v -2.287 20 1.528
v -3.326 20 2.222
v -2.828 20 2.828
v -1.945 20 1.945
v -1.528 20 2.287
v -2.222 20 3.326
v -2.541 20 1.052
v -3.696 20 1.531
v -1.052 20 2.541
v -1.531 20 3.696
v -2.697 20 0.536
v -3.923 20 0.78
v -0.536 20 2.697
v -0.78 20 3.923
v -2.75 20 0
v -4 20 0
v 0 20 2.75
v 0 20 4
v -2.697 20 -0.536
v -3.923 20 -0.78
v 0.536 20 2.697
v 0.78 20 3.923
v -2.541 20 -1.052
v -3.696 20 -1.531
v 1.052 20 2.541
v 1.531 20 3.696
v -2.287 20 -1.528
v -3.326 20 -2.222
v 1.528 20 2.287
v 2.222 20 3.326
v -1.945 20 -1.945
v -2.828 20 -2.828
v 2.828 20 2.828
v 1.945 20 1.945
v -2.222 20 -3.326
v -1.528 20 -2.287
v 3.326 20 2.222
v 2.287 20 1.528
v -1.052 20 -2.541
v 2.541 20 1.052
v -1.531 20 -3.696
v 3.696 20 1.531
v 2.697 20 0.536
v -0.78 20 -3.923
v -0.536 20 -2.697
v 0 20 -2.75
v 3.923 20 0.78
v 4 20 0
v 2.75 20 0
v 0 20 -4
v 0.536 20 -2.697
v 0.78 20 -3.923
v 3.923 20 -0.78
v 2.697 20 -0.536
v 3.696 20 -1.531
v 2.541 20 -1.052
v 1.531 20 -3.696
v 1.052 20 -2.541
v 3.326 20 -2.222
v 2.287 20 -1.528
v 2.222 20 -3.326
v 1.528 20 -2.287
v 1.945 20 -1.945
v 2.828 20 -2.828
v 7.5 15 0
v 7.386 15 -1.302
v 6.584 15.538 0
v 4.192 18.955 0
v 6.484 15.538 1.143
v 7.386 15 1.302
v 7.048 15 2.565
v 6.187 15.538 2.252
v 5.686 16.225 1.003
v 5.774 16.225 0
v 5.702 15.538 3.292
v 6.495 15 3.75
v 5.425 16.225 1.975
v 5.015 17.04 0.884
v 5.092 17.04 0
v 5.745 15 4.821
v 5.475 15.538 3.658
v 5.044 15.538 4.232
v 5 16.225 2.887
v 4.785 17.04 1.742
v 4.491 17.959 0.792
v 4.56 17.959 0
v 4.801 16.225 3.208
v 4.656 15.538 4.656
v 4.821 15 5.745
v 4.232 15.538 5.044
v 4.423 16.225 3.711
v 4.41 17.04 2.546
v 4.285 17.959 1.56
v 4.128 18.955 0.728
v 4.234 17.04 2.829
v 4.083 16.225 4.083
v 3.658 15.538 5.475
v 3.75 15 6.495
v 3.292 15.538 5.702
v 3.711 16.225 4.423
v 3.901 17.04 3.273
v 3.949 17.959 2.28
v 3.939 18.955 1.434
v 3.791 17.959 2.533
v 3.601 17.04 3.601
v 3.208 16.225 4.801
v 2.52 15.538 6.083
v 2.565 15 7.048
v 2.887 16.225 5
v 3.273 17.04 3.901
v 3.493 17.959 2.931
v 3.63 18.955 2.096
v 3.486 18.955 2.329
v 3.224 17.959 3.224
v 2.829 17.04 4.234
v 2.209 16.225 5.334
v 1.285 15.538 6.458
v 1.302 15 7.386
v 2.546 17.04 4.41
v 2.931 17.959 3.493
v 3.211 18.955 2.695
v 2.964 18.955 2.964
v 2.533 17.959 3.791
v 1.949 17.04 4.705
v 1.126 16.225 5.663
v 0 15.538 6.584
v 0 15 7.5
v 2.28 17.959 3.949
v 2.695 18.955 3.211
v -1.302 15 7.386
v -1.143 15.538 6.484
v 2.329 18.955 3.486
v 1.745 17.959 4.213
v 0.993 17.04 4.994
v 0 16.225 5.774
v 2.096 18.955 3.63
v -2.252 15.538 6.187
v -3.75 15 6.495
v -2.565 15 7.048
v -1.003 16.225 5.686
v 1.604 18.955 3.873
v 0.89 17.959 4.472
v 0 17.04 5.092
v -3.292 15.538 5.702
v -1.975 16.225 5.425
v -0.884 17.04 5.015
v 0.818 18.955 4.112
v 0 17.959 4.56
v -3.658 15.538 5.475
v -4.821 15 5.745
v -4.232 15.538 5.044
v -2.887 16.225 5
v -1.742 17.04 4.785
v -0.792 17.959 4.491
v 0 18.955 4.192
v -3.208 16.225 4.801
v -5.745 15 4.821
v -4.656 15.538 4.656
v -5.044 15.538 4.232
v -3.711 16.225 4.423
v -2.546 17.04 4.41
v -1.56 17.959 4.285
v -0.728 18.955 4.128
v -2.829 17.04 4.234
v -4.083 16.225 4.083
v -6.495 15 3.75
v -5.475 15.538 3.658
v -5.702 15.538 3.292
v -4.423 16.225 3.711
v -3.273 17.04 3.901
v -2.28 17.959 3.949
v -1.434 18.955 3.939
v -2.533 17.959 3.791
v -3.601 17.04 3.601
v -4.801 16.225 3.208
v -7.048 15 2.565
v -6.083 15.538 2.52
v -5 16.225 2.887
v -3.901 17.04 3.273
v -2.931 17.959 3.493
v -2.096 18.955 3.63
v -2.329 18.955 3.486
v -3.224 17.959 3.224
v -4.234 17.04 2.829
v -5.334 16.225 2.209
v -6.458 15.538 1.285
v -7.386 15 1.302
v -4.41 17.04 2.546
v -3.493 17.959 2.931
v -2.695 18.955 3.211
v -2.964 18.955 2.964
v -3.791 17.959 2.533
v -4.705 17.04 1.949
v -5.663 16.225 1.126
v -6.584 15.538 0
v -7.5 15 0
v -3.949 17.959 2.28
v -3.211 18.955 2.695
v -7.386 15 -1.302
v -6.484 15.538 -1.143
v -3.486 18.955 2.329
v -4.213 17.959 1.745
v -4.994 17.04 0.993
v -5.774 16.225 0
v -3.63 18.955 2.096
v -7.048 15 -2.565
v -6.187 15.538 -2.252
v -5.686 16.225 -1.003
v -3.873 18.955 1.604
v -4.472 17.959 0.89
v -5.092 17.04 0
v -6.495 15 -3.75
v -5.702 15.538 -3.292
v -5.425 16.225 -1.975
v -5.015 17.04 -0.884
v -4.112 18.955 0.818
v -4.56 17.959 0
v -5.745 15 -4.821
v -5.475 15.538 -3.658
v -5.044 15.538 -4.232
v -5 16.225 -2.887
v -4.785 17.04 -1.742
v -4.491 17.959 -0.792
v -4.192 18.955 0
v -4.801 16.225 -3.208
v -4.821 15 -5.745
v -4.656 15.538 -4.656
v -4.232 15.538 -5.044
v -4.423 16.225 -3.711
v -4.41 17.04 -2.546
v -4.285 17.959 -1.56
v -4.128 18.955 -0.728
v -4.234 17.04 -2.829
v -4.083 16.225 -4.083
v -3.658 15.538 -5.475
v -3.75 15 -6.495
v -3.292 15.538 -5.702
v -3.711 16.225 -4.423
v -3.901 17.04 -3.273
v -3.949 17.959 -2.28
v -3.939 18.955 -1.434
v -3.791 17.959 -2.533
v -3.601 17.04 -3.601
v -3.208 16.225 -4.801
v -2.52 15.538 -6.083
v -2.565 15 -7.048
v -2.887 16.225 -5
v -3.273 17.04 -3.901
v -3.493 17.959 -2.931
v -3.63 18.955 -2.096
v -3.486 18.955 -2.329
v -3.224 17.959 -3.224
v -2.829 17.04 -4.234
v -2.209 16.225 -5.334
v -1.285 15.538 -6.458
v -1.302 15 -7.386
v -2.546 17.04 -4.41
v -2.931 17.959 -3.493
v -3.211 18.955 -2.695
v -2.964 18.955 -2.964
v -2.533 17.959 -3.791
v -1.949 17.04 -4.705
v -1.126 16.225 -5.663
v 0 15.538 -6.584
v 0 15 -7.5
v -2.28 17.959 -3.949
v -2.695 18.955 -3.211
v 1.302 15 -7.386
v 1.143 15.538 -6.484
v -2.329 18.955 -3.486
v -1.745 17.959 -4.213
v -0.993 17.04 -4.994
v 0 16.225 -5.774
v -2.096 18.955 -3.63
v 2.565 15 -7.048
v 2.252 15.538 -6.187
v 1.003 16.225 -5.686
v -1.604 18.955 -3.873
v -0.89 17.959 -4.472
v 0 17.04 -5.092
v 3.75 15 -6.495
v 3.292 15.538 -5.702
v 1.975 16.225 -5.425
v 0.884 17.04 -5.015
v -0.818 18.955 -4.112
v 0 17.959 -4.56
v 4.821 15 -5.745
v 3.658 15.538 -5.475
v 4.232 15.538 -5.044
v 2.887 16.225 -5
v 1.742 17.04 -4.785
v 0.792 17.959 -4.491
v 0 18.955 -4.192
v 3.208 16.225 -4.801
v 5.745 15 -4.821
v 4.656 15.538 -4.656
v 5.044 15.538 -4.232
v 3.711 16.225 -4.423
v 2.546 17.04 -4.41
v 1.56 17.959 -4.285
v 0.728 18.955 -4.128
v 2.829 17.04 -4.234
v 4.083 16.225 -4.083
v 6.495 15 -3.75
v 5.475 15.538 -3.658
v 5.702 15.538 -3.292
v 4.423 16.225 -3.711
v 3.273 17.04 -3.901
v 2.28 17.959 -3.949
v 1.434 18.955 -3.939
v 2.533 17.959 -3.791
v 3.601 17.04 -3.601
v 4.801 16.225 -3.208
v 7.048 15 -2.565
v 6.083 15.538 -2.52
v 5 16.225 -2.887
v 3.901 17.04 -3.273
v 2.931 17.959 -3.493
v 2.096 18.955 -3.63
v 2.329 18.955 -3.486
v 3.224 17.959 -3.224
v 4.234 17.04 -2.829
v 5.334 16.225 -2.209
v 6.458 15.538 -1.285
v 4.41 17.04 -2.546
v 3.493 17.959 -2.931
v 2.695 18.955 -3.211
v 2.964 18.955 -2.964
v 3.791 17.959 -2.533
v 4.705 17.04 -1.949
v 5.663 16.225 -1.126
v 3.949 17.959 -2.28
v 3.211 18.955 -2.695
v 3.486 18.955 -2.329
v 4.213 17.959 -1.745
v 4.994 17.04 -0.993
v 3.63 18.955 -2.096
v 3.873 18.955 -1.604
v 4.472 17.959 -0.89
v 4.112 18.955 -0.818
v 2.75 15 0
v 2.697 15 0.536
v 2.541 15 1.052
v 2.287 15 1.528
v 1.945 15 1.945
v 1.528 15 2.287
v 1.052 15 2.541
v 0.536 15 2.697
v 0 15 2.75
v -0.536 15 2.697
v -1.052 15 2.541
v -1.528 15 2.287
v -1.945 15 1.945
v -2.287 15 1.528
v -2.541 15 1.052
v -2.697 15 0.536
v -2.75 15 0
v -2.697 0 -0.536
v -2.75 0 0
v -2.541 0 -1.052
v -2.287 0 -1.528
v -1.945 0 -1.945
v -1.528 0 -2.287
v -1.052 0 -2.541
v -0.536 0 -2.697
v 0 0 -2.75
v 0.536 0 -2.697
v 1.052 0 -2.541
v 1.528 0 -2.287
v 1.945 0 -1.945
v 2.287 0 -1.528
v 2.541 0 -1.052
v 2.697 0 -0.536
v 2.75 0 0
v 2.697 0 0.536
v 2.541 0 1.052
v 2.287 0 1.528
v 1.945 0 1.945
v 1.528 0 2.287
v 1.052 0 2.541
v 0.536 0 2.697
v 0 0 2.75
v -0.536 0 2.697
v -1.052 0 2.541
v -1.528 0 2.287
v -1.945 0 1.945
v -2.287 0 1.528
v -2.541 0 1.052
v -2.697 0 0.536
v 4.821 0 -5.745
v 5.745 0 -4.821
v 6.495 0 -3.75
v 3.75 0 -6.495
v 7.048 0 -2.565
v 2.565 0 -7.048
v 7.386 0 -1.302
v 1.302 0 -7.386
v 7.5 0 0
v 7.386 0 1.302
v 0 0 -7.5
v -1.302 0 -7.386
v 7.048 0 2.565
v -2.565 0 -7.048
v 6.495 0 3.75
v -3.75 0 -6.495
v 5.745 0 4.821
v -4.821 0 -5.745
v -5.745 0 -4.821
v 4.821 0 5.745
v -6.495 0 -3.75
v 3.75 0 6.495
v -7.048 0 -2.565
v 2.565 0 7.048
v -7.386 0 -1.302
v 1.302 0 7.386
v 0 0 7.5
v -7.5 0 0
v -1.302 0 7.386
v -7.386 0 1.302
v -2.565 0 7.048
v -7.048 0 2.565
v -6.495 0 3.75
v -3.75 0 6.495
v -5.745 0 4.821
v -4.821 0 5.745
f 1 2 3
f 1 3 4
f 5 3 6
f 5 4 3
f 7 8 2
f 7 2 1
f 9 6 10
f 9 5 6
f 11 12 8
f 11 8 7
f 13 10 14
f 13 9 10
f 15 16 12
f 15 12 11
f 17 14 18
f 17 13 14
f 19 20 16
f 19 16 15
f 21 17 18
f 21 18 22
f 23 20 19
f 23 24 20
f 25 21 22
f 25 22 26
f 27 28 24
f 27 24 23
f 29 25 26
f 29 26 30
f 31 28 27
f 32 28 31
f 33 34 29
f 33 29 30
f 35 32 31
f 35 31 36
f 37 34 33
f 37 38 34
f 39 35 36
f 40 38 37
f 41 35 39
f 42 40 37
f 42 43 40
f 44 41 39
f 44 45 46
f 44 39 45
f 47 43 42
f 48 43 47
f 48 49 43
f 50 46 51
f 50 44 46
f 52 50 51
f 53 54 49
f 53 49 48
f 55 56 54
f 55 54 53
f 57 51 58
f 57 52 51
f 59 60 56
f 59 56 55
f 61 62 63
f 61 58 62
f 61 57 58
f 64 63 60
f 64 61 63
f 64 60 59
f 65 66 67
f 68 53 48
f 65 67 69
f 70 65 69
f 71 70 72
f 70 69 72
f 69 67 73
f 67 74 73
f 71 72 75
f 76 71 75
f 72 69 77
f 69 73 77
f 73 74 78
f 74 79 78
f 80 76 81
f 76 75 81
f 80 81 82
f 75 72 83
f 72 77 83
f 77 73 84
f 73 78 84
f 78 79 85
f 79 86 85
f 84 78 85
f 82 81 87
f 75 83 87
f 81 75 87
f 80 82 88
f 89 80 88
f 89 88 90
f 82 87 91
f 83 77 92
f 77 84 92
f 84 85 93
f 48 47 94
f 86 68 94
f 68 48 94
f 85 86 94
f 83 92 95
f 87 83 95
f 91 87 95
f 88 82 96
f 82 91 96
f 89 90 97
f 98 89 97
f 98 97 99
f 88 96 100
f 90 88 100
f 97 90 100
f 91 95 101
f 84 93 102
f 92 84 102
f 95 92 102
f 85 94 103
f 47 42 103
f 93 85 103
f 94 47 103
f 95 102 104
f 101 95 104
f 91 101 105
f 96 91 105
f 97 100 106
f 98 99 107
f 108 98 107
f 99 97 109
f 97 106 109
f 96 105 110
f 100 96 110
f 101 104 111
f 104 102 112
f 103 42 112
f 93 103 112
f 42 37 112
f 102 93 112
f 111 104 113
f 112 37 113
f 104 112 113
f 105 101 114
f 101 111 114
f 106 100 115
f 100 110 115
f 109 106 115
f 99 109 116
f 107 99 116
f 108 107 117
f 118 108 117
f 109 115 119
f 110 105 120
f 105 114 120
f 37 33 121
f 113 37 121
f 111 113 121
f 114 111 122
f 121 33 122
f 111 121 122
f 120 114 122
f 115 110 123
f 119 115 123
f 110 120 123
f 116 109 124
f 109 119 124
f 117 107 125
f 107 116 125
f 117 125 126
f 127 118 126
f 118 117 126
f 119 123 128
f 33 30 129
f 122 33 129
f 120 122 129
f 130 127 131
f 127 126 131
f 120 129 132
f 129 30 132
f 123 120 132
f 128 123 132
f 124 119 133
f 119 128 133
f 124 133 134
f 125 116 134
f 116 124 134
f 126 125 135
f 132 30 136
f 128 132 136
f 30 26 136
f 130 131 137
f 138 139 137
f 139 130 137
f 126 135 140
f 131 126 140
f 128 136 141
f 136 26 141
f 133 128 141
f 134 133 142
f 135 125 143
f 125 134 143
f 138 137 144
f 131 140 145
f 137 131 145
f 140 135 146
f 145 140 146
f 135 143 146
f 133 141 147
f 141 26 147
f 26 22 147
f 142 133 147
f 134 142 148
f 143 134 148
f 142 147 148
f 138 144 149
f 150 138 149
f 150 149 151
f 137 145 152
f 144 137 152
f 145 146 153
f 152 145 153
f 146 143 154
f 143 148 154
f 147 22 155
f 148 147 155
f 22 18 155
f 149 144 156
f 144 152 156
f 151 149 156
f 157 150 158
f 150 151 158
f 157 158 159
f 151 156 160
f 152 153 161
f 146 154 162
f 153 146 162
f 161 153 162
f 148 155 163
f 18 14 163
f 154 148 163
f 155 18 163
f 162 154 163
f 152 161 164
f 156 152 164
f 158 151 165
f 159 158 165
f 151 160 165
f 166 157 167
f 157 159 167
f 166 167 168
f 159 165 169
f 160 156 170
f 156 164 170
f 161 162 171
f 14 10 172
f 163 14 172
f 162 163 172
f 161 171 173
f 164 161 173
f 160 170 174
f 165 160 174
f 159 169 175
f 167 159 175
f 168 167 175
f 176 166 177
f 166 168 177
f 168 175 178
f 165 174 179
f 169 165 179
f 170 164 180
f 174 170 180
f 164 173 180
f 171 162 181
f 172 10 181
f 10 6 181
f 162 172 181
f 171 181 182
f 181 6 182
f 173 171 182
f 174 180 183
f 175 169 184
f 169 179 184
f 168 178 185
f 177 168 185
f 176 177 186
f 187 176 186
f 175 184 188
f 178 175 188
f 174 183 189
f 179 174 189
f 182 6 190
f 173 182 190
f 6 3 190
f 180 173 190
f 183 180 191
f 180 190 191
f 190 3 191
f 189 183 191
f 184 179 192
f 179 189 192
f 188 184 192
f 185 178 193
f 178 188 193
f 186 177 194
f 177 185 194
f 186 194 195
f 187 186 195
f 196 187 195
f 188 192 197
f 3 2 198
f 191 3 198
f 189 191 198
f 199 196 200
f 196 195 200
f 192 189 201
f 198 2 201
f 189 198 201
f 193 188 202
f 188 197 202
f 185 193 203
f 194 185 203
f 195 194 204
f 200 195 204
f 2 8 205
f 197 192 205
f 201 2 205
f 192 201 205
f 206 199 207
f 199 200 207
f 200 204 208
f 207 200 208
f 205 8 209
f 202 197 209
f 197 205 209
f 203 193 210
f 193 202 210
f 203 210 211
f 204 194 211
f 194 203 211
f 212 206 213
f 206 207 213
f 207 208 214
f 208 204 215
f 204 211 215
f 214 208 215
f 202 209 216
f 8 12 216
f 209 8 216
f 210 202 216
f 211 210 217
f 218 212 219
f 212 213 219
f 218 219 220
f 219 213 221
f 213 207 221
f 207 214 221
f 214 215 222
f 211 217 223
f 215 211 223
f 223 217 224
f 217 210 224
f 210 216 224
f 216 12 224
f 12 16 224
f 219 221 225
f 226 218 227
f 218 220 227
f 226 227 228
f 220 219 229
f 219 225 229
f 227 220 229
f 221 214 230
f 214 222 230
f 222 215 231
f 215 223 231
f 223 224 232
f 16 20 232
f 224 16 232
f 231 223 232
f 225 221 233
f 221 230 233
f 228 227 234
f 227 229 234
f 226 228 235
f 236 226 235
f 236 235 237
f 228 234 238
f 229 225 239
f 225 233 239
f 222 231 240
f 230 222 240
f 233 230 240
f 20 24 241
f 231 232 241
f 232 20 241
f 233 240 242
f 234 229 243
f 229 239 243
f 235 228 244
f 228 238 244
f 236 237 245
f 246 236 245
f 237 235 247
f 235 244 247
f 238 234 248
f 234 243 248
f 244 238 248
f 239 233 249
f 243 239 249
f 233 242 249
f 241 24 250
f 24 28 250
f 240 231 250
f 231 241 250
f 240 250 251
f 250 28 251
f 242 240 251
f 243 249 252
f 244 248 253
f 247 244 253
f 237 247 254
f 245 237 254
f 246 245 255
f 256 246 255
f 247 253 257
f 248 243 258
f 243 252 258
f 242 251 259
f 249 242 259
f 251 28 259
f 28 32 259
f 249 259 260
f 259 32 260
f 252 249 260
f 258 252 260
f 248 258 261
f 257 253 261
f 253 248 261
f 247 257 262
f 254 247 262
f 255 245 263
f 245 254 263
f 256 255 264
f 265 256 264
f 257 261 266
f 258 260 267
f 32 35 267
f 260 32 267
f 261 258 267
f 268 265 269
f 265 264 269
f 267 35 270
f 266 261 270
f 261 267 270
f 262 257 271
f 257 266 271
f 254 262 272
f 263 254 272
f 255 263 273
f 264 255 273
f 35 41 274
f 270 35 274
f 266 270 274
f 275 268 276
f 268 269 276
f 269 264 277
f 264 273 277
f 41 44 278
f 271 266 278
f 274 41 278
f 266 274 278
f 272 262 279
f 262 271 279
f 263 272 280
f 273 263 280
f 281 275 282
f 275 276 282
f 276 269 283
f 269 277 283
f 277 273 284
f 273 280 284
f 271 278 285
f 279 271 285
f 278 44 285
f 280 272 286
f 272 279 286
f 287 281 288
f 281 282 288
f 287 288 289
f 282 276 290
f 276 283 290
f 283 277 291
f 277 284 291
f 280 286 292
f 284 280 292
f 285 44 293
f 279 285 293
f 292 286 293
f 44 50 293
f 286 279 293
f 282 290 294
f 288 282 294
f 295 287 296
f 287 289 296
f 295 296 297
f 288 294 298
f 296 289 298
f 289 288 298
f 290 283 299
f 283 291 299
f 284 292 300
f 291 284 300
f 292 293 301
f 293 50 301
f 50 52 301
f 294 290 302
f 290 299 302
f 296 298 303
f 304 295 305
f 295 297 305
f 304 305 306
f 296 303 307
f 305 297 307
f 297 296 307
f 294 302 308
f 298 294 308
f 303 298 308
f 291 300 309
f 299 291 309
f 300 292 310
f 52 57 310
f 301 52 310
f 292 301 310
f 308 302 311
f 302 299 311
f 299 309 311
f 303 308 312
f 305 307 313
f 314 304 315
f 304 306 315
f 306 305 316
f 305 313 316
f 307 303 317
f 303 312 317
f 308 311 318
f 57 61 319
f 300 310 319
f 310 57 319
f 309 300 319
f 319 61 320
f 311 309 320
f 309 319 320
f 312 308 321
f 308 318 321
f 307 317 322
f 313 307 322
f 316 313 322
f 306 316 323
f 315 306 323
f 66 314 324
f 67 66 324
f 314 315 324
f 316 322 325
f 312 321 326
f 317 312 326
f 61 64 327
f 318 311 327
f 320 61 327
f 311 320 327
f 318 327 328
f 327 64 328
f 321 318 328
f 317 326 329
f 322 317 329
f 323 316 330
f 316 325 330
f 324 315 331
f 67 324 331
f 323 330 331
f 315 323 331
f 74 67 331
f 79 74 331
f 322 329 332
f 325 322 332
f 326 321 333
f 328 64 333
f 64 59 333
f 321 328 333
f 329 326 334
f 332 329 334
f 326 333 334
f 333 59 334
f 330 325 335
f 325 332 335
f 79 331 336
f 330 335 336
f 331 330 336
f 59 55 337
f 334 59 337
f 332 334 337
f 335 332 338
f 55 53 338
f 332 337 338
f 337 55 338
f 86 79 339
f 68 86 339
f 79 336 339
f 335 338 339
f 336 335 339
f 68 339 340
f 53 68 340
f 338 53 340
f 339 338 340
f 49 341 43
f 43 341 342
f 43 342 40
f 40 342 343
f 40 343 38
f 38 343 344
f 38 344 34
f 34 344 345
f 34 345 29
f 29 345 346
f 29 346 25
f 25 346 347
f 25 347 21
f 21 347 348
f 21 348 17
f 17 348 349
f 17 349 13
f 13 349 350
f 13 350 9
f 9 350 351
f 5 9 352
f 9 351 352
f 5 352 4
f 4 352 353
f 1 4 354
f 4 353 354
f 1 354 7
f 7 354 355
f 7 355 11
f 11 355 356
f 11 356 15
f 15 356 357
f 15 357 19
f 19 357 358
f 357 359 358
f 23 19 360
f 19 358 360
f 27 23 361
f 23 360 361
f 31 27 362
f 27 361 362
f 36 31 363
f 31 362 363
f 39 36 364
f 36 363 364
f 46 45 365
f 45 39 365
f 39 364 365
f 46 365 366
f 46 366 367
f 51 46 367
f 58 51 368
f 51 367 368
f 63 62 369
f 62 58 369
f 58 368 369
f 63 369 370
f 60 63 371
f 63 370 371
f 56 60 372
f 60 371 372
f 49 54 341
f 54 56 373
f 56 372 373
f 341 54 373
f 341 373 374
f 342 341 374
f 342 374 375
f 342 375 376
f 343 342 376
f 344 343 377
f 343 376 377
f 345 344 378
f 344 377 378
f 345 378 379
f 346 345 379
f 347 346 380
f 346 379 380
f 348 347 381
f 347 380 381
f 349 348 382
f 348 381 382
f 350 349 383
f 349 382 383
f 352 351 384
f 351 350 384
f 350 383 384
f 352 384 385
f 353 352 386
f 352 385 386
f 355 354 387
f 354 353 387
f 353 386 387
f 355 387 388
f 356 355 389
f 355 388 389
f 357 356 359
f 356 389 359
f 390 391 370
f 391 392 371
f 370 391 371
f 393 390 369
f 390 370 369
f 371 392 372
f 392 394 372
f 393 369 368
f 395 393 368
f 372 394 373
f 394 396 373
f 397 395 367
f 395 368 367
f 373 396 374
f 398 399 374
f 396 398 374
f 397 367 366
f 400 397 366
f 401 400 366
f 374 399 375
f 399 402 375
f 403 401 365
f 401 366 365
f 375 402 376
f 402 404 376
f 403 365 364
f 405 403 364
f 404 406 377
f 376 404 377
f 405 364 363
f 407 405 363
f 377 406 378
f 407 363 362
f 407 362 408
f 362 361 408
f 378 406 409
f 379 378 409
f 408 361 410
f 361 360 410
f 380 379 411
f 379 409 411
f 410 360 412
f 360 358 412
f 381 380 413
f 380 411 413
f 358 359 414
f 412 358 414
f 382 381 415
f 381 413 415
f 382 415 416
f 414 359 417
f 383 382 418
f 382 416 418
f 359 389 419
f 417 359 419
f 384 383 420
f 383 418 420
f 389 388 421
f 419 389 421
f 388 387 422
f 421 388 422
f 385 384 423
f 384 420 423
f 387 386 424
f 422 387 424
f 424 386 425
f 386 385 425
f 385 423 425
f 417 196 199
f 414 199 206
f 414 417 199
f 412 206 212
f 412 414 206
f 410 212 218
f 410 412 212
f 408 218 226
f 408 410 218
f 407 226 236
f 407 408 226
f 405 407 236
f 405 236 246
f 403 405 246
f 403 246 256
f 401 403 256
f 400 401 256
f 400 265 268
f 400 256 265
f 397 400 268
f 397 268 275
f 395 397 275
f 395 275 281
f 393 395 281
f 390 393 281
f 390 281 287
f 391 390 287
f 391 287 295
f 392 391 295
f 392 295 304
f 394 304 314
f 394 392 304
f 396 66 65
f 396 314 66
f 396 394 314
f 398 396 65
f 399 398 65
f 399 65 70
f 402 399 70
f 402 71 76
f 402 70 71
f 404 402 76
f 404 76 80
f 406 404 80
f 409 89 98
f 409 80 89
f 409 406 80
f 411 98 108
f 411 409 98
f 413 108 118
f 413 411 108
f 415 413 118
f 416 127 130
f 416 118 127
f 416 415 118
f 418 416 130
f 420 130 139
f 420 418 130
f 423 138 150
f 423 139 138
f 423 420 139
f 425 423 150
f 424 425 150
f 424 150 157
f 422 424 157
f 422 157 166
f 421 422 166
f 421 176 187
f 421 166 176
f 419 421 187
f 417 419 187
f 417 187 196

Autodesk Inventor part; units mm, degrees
ref_plane "YZ Plane" through (0, 0, 0) normal (1, 0, 0) x (0, 1, 0)
ref_plane "XZ Plane" through (0, 0, 0) normal (0, 1, 0) x (-1, 0, 0)
ref_plane "XY Plane" through (0, 0, 0) normal (0, 0, 1) x (1, 0, 0)
sketch "Sketch1" plane through (0, 0, 0) normal (0, 1, 0) x (-1, 0, 0)
  circle A0 centre (0, 0) radius 7.5
  circle A1 centre (0, 0) radius 2.75
  dimension "d0" = 15
  dimension "d1" = 5.5
extrude "Extrusion1" add sketch "Sketch1" along normal blind 15
sketch "Sketch2" plane through (0, 15, 0) normal (0, 1, 0) x (1, 0, 0)
  circle A0 centre (0, 0) radius 2.75
  circle A1 centre (0, 0) radius 2.75 projected
  circle A2 centre (0, 0) radius 4
  dimension "d4" = 5.5
  dimension "d5" = 8
extrude "Extrusion2" add sketch "Sketch2" along normal blind 5
fillet "Fillet1" radius 6.2 1 edges at (-4, 15, 0)
properties part number "Rollder_Spacer_Single"
